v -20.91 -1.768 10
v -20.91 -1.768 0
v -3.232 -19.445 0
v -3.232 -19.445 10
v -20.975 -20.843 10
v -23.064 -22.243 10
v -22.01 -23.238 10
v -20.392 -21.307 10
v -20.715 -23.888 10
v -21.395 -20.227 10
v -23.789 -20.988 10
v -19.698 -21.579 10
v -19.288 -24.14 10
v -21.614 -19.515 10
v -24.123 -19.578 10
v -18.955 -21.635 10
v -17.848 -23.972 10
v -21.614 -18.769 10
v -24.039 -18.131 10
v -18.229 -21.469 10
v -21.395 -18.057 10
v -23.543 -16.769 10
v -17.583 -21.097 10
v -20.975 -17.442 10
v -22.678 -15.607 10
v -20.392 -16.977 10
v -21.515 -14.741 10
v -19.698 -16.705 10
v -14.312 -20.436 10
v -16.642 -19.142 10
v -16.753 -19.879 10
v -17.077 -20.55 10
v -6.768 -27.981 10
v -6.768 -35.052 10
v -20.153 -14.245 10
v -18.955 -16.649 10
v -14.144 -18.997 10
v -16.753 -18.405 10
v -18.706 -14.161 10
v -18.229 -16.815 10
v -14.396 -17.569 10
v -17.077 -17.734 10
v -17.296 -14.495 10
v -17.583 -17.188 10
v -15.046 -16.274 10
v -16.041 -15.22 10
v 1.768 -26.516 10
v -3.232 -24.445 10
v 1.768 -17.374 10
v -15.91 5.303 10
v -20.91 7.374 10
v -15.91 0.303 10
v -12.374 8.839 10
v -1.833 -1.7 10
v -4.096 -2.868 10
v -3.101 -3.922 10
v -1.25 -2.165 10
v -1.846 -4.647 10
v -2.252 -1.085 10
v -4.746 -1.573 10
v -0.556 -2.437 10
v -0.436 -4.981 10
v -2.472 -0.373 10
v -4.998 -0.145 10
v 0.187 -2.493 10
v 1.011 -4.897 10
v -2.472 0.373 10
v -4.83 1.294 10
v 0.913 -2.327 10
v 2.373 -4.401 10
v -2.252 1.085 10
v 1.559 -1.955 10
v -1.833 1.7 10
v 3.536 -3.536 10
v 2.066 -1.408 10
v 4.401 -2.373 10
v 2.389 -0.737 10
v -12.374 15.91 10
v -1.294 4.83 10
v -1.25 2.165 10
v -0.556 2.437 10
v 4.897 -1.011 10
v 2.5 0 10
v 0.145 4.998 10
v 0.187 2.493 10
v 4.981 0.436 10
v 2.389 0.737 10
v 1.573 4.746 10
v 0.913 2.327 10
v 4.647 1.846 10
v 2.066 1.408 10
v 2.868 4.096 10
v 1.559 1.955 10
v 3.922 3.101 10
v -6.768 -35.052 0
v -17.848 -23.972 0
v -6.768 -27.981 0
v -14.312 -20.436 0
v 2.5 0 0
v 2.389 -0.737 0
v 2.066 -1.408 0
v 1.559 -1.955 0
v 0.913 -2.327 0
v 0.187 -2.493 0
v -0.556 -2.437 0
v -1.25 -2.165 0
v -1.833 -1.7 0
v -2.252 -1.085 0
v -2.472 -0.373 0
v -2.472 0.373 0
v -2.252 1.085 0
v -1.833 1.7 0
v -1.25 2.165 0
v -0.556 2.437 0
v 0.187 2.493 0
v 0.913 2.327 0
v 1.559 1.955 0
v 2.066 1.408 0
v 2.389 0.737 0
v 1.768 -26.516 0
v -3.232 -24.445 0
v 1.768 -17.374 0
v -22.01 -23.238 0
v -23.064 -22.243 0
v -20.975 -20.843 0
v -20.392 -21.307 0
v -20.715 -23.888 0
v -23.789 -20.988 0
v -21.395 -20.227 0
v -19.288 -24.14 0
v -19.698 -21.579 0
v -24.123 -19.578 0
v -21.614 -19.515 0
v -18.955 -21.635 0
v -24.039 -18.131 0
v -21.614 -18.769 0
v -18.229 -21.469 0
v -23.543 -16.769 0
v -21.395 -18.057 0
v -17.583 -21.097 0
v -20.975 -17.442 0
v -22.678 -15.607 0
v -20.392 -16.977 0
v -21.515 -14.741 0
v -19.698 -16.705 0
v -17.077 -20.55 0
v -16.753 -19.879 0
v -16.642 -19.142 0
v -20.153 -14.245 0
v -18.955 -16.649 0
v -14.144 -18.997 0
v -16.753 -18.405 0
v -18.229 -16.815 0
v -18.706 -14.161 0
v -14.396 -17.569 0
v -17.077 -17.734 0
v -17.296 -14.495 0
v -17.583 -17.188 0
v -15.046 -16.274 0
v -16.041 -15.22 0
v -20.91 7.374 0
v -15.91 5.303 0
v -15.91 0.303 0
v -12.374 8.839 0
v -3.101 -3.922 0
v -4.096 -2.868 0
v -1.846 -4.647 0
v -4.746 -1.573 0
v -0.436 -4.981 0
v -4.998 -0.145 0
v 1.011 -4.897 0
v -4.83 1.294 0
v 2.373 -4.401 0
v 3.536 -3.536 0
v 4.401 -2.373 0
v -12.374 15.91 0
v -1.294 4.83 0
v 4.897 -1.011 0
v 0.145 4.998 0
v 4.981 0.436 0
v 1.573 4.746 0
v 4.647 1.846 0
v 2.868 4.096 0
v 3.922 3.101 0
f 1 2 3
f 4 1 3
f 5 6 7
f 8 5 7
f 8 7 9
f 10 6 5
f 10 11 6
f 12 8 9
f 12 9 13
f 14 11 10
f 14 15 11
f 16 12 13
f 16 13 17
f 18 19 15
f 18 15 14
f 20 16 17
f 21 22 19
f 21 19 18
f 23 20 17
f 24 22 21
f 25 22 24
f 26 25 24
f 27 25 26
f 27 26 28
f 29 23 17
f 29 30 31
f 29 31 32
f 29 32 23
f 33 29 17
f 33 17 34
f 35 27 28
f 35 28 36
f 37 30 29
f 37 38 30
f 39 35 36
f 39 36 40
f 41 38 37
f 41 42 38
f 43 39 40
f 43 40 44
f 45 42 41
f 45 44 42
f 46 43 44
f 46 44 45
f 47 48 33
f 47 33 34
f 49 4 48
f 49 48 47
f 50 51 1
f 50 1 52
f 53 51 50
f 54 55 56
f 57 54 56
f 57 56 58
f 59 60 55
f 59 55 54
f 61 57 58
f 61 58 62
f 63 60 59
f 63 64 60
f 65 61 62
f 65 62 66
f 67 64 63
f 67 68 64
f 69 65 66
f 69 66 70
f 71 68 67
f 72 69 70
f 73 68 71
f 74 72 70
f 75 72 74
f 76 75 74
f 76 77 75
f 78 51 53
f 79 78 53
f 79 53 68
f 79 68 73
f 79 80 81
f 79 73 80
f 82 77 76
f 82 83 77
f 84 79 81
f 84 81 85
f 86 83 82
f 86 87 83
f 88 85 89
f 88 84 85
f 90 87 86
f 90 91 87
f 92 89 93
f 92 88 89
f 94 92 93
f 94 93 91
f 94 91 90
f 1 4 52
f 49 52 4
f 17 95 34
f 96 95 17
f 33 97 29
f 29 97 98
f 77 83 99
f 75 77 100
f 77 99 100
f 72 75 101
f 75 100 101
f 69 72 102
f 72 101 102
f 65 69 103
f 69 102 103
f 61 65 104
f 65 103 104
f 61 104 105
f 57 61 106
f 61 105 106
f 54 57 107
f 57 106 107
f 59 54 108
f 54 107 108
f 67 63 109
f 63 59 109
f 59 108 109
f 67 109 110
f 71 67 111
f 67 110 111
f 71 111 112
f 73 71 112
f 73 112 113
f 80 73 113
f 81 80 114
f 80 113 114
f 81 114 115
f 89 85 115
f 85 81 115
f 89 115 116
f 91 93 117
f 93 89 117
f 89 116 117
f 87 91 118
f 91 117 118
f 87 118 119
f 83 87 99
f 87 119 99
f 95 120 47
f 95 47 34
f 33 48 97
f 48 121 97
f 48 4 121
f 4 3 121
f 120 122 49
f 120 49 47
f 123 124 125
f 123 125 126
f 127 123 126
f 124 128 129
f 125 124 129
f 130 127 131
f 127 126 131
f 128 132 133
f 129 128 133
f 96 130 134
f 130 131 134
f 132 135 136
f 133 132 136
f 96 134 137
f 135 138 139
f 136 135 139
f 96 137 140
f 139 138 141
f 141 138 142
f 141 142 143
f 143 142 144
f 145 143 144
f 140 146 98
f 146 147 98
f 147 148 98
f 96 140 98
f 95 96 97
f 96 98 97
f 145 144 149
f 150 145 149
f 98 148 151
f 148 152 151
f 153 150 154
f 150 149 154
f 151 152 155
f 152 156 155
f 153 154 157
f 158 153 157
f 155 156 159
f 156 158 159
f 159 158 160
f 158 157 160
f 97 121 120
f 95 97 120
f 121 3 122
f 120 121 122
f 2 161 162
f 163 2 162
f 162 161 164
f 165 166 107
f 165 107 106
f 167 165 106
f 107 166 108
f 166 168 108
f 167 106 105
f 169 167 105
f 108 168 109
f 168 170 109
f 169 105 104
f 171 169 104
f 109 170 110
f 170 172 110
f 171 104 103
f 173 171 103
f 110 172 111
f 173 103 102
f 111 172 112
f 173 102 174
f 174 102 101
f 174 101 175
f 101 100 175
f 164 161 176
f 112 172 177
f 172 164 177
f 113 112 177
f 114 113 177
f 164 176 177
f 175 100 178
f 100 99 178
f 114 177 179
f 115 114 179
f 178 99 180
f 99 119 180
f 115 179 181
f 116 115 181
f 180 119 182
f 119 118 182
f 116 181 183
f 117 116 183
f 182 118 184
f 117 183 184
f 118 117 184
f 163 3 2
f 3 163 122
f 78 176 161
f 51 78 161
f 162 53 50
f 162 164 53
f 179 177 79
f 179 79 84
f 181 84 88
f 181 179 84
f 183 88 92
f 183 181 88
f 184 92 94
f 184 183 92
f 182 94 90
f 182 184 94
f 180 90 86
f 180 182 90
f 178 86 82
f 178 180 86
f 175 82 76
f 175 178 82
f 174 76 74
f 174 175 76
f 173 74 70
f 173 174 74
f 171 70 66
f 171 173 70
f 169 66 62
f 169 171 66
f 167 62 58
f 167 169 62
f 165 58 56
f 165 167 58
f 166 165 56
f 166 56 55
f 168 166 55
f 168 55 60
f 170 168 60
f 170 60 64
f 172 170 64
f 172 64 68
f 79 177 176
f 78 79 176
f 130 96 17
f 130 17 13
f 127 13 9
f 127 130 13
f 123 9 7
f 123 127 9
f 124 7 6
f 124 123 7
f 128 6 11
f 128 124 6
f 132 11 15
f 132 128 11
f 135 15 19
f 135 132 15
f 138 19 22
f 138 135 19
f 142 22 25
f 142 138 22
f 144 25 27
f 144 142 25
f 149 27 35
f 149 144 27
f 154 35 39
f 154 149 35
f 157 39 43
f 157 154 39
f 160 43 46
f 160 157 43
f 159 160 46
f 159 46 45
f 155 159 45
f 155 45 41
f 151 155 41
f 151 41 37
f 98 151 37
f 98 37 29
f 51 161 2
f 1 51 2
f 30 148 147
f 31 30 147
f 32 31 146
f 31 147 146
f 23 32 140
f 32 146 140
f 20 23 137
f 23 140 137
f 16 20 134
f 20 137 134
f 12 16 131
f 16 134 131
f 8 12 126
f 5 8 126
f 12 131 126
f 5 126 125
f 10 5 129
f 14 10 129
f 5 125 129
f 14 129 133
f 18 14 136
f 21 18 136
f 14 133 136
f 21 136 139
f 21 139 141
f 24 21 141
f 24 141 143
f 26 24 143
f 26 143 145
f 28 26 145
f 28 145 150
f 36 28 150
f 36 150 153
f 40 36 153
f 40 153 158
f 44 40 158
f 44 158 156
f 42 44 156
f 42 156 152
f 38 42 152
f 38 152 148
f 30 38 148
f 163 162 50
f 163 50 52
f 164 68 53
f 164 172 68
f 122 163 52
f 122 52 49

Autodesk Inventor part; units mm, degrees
ref_plane "YZ Plane" through (0, 0, 0) normal (1, 0, 0) x (0, 1, 0)
ref_plane "XZ Plane" through (0, 0, 0) normal (0, 1, 0) x (-1, 0, 0)
ref_plane "XY Plane" through (0, 0, 0) normal (0, 0, 1) x (1, 0, 0)
sketch "Sketch1" plane through (0, 0, 0) normal (0, 0, 1) x (1, 0, 0)
  circle A0 centre (0, 0) radius 2.5
  circle A1 centre (0, 0) radius 5
  line L0 (-1.7678, -1.7678) -> (-12.3744, 8.8388)
  line L1 (-12.3744, 8.8388) -> (-15.9099, 5.3033)
  line L2 (-15.9099, 5.3033) -> (-15.9099, 0.3033)
  line L3 (-15.9099, 0.3033) -> (1.7678, -17.3744)
  line L4 (1.7678, -17.3744) -> (1.7678, -26.5165)
  line L5 (1.7678, -26.5165) -> (-6.7678, -35.052)
  line L6 (-6.7678, -35.052) -> (-20.9099, -20.9099)
  line L7 (1.7678, 1.7678) -> (-12.3744, 15.9099)
  line L8 (-12.3744, 15.9099) -> (-20.9099, 7.3744)
  line L9 (-20.9099, 7.3744) -> (-20.9099, -1.7678)
  line L10 (-20.9099, -1.7678) -> (-3.2322, -19.4454)
  line L11 (-3.2322, -19.4454) -> (-3.2322, -24.4454)
  line L12 (-3.2322, -24.4454) -> (-6.7678, -27.981)
  line L13 (-6.7678, -27.981) -> (-17.3744, -17.3744)
  line L14 (-17.3744, -17.3744) -> (-20.9099, -20.9099)
  line L15 (-1.7678, -1.7678) -> (1.7678, 1.7678)
  circle A2 centre (-19.1421, -19.1421) radius 2.5
  circle A3 centre (-19.1421, -19.1421) radius 5
  dimension "d0" = 5
  dimension "d1" = 10
  dimension "d3" = 90
  dimension "d4" = 135
  dimension "d5" = 135
  dimension "d6" = 135
  dimension "d7" = 135
  dimension "d8" = 90
  dimension "d9" = 5
  dimension "d12" = 10
  dimension "d13" = 15
  dimension "d14" = 15
  dimension "d15" = 5
  dimension "d16" = 5
  dimension "d17" = 5
  dimension "d18" = 5
  dimension "d20" = 20
  dimension "d21" = 20
  dimension "d22" = 5
  dimension "d23" = 5
  dimension "d24" = 5
extrude "Extrusion2" add sketch "Sketch1" along normal blind 10 contours A0 L7 A1 L0 | A0 L0 A1 L7 | A1 L0 L1 L2 L3 L4 L5 L6 A3 L13 L12 L11 L10 L9 L8 L7 | A3 L6 A2 L13 | L13 A2 L6 A3 | A2 L14 picked at (-18.68, -20.1685)
sketch "Sketch2" plane through (0, 0, 10) normal (0, 0, 1) x (1, 0, 0)
  line L0 (-1.2941, 4.8296) -> (-12.3744, 15.9099) projected
  line L1 (-12.3744, 15.9099) -> (-20.9099, 7.3744) projected
  line L2 (-20.9099, 7.3744) -> (-20.9099, -1.7678) projected
  line L3 (-20.9099, -1.7678) -> (-3.2322, -19.4454) projected
  line L4 (-3.2322, -19.4454) -> (-3.2322, -24.4454) projected
  line L5 (-3.2322, -24.4454) -> (-6.7678, -27.981) projected
  line L6 (-6.7678, -27.981) -> (-14.3125, -20.4362) projected
  arc A0 (-14.3125, -20.4362) -> (-17.848, -23.9718) centre (-19.1421, -19.1421) ccw projected
  line L7 (-17.848, -23.9718) -> (-6.7678, -35.052) projected
  line L8 (-6.7678, -35.052) -> (1.7678, -26.5165) projected
  line L9 (1.7678, -26.5165) -> (1.7678, -17.3744) projected
  line L10 (1.7678, -17.3744) -> (-15.9099, 0.3033) projected
  line L11 (-15.9099, 0.3033) -> (-15.9099, 5.3033) projected
  line L12 (-15.9099, 5.3033) -> (-12.3744, 8.8388) projected
  line L13 (-12.3744, 8.8388) -> (-4.8296, 1.2941) projected
  arc A1 (-4.8296, 1.2941) -> (-1.2941, 4.8296) centre (0, 0) ccw projected
  line L14 (-20.9099, -20.9099) -> (-17.3744, -17.3744) projected
  arc A2 (-17.3744, -17.3744) -> (-20.9099, -20.9099) centre (-19.1421, -19.1421) ccw projected
  circle A3 centre (0, 0) radius 2.5 projected
  circle A4 centre (-19.1421, -19.1421) radius 2.5
extrude "Extrusion3" cut sketch "Sketch2" against normal blind 10 contours L14 A4
equation "\"d1\" = 2 * d0"
equation "\"d9\" = d0"
equation "\"d12\" = d1"
equation "\"d13\" = 3 * d0"
equation "\"d14\" = d13"
equation "\"d15\" = d0"
equation "\"d17\" = d15"
equation "\"d18\" = d16"
properties part number "Sawaiz Logo"
